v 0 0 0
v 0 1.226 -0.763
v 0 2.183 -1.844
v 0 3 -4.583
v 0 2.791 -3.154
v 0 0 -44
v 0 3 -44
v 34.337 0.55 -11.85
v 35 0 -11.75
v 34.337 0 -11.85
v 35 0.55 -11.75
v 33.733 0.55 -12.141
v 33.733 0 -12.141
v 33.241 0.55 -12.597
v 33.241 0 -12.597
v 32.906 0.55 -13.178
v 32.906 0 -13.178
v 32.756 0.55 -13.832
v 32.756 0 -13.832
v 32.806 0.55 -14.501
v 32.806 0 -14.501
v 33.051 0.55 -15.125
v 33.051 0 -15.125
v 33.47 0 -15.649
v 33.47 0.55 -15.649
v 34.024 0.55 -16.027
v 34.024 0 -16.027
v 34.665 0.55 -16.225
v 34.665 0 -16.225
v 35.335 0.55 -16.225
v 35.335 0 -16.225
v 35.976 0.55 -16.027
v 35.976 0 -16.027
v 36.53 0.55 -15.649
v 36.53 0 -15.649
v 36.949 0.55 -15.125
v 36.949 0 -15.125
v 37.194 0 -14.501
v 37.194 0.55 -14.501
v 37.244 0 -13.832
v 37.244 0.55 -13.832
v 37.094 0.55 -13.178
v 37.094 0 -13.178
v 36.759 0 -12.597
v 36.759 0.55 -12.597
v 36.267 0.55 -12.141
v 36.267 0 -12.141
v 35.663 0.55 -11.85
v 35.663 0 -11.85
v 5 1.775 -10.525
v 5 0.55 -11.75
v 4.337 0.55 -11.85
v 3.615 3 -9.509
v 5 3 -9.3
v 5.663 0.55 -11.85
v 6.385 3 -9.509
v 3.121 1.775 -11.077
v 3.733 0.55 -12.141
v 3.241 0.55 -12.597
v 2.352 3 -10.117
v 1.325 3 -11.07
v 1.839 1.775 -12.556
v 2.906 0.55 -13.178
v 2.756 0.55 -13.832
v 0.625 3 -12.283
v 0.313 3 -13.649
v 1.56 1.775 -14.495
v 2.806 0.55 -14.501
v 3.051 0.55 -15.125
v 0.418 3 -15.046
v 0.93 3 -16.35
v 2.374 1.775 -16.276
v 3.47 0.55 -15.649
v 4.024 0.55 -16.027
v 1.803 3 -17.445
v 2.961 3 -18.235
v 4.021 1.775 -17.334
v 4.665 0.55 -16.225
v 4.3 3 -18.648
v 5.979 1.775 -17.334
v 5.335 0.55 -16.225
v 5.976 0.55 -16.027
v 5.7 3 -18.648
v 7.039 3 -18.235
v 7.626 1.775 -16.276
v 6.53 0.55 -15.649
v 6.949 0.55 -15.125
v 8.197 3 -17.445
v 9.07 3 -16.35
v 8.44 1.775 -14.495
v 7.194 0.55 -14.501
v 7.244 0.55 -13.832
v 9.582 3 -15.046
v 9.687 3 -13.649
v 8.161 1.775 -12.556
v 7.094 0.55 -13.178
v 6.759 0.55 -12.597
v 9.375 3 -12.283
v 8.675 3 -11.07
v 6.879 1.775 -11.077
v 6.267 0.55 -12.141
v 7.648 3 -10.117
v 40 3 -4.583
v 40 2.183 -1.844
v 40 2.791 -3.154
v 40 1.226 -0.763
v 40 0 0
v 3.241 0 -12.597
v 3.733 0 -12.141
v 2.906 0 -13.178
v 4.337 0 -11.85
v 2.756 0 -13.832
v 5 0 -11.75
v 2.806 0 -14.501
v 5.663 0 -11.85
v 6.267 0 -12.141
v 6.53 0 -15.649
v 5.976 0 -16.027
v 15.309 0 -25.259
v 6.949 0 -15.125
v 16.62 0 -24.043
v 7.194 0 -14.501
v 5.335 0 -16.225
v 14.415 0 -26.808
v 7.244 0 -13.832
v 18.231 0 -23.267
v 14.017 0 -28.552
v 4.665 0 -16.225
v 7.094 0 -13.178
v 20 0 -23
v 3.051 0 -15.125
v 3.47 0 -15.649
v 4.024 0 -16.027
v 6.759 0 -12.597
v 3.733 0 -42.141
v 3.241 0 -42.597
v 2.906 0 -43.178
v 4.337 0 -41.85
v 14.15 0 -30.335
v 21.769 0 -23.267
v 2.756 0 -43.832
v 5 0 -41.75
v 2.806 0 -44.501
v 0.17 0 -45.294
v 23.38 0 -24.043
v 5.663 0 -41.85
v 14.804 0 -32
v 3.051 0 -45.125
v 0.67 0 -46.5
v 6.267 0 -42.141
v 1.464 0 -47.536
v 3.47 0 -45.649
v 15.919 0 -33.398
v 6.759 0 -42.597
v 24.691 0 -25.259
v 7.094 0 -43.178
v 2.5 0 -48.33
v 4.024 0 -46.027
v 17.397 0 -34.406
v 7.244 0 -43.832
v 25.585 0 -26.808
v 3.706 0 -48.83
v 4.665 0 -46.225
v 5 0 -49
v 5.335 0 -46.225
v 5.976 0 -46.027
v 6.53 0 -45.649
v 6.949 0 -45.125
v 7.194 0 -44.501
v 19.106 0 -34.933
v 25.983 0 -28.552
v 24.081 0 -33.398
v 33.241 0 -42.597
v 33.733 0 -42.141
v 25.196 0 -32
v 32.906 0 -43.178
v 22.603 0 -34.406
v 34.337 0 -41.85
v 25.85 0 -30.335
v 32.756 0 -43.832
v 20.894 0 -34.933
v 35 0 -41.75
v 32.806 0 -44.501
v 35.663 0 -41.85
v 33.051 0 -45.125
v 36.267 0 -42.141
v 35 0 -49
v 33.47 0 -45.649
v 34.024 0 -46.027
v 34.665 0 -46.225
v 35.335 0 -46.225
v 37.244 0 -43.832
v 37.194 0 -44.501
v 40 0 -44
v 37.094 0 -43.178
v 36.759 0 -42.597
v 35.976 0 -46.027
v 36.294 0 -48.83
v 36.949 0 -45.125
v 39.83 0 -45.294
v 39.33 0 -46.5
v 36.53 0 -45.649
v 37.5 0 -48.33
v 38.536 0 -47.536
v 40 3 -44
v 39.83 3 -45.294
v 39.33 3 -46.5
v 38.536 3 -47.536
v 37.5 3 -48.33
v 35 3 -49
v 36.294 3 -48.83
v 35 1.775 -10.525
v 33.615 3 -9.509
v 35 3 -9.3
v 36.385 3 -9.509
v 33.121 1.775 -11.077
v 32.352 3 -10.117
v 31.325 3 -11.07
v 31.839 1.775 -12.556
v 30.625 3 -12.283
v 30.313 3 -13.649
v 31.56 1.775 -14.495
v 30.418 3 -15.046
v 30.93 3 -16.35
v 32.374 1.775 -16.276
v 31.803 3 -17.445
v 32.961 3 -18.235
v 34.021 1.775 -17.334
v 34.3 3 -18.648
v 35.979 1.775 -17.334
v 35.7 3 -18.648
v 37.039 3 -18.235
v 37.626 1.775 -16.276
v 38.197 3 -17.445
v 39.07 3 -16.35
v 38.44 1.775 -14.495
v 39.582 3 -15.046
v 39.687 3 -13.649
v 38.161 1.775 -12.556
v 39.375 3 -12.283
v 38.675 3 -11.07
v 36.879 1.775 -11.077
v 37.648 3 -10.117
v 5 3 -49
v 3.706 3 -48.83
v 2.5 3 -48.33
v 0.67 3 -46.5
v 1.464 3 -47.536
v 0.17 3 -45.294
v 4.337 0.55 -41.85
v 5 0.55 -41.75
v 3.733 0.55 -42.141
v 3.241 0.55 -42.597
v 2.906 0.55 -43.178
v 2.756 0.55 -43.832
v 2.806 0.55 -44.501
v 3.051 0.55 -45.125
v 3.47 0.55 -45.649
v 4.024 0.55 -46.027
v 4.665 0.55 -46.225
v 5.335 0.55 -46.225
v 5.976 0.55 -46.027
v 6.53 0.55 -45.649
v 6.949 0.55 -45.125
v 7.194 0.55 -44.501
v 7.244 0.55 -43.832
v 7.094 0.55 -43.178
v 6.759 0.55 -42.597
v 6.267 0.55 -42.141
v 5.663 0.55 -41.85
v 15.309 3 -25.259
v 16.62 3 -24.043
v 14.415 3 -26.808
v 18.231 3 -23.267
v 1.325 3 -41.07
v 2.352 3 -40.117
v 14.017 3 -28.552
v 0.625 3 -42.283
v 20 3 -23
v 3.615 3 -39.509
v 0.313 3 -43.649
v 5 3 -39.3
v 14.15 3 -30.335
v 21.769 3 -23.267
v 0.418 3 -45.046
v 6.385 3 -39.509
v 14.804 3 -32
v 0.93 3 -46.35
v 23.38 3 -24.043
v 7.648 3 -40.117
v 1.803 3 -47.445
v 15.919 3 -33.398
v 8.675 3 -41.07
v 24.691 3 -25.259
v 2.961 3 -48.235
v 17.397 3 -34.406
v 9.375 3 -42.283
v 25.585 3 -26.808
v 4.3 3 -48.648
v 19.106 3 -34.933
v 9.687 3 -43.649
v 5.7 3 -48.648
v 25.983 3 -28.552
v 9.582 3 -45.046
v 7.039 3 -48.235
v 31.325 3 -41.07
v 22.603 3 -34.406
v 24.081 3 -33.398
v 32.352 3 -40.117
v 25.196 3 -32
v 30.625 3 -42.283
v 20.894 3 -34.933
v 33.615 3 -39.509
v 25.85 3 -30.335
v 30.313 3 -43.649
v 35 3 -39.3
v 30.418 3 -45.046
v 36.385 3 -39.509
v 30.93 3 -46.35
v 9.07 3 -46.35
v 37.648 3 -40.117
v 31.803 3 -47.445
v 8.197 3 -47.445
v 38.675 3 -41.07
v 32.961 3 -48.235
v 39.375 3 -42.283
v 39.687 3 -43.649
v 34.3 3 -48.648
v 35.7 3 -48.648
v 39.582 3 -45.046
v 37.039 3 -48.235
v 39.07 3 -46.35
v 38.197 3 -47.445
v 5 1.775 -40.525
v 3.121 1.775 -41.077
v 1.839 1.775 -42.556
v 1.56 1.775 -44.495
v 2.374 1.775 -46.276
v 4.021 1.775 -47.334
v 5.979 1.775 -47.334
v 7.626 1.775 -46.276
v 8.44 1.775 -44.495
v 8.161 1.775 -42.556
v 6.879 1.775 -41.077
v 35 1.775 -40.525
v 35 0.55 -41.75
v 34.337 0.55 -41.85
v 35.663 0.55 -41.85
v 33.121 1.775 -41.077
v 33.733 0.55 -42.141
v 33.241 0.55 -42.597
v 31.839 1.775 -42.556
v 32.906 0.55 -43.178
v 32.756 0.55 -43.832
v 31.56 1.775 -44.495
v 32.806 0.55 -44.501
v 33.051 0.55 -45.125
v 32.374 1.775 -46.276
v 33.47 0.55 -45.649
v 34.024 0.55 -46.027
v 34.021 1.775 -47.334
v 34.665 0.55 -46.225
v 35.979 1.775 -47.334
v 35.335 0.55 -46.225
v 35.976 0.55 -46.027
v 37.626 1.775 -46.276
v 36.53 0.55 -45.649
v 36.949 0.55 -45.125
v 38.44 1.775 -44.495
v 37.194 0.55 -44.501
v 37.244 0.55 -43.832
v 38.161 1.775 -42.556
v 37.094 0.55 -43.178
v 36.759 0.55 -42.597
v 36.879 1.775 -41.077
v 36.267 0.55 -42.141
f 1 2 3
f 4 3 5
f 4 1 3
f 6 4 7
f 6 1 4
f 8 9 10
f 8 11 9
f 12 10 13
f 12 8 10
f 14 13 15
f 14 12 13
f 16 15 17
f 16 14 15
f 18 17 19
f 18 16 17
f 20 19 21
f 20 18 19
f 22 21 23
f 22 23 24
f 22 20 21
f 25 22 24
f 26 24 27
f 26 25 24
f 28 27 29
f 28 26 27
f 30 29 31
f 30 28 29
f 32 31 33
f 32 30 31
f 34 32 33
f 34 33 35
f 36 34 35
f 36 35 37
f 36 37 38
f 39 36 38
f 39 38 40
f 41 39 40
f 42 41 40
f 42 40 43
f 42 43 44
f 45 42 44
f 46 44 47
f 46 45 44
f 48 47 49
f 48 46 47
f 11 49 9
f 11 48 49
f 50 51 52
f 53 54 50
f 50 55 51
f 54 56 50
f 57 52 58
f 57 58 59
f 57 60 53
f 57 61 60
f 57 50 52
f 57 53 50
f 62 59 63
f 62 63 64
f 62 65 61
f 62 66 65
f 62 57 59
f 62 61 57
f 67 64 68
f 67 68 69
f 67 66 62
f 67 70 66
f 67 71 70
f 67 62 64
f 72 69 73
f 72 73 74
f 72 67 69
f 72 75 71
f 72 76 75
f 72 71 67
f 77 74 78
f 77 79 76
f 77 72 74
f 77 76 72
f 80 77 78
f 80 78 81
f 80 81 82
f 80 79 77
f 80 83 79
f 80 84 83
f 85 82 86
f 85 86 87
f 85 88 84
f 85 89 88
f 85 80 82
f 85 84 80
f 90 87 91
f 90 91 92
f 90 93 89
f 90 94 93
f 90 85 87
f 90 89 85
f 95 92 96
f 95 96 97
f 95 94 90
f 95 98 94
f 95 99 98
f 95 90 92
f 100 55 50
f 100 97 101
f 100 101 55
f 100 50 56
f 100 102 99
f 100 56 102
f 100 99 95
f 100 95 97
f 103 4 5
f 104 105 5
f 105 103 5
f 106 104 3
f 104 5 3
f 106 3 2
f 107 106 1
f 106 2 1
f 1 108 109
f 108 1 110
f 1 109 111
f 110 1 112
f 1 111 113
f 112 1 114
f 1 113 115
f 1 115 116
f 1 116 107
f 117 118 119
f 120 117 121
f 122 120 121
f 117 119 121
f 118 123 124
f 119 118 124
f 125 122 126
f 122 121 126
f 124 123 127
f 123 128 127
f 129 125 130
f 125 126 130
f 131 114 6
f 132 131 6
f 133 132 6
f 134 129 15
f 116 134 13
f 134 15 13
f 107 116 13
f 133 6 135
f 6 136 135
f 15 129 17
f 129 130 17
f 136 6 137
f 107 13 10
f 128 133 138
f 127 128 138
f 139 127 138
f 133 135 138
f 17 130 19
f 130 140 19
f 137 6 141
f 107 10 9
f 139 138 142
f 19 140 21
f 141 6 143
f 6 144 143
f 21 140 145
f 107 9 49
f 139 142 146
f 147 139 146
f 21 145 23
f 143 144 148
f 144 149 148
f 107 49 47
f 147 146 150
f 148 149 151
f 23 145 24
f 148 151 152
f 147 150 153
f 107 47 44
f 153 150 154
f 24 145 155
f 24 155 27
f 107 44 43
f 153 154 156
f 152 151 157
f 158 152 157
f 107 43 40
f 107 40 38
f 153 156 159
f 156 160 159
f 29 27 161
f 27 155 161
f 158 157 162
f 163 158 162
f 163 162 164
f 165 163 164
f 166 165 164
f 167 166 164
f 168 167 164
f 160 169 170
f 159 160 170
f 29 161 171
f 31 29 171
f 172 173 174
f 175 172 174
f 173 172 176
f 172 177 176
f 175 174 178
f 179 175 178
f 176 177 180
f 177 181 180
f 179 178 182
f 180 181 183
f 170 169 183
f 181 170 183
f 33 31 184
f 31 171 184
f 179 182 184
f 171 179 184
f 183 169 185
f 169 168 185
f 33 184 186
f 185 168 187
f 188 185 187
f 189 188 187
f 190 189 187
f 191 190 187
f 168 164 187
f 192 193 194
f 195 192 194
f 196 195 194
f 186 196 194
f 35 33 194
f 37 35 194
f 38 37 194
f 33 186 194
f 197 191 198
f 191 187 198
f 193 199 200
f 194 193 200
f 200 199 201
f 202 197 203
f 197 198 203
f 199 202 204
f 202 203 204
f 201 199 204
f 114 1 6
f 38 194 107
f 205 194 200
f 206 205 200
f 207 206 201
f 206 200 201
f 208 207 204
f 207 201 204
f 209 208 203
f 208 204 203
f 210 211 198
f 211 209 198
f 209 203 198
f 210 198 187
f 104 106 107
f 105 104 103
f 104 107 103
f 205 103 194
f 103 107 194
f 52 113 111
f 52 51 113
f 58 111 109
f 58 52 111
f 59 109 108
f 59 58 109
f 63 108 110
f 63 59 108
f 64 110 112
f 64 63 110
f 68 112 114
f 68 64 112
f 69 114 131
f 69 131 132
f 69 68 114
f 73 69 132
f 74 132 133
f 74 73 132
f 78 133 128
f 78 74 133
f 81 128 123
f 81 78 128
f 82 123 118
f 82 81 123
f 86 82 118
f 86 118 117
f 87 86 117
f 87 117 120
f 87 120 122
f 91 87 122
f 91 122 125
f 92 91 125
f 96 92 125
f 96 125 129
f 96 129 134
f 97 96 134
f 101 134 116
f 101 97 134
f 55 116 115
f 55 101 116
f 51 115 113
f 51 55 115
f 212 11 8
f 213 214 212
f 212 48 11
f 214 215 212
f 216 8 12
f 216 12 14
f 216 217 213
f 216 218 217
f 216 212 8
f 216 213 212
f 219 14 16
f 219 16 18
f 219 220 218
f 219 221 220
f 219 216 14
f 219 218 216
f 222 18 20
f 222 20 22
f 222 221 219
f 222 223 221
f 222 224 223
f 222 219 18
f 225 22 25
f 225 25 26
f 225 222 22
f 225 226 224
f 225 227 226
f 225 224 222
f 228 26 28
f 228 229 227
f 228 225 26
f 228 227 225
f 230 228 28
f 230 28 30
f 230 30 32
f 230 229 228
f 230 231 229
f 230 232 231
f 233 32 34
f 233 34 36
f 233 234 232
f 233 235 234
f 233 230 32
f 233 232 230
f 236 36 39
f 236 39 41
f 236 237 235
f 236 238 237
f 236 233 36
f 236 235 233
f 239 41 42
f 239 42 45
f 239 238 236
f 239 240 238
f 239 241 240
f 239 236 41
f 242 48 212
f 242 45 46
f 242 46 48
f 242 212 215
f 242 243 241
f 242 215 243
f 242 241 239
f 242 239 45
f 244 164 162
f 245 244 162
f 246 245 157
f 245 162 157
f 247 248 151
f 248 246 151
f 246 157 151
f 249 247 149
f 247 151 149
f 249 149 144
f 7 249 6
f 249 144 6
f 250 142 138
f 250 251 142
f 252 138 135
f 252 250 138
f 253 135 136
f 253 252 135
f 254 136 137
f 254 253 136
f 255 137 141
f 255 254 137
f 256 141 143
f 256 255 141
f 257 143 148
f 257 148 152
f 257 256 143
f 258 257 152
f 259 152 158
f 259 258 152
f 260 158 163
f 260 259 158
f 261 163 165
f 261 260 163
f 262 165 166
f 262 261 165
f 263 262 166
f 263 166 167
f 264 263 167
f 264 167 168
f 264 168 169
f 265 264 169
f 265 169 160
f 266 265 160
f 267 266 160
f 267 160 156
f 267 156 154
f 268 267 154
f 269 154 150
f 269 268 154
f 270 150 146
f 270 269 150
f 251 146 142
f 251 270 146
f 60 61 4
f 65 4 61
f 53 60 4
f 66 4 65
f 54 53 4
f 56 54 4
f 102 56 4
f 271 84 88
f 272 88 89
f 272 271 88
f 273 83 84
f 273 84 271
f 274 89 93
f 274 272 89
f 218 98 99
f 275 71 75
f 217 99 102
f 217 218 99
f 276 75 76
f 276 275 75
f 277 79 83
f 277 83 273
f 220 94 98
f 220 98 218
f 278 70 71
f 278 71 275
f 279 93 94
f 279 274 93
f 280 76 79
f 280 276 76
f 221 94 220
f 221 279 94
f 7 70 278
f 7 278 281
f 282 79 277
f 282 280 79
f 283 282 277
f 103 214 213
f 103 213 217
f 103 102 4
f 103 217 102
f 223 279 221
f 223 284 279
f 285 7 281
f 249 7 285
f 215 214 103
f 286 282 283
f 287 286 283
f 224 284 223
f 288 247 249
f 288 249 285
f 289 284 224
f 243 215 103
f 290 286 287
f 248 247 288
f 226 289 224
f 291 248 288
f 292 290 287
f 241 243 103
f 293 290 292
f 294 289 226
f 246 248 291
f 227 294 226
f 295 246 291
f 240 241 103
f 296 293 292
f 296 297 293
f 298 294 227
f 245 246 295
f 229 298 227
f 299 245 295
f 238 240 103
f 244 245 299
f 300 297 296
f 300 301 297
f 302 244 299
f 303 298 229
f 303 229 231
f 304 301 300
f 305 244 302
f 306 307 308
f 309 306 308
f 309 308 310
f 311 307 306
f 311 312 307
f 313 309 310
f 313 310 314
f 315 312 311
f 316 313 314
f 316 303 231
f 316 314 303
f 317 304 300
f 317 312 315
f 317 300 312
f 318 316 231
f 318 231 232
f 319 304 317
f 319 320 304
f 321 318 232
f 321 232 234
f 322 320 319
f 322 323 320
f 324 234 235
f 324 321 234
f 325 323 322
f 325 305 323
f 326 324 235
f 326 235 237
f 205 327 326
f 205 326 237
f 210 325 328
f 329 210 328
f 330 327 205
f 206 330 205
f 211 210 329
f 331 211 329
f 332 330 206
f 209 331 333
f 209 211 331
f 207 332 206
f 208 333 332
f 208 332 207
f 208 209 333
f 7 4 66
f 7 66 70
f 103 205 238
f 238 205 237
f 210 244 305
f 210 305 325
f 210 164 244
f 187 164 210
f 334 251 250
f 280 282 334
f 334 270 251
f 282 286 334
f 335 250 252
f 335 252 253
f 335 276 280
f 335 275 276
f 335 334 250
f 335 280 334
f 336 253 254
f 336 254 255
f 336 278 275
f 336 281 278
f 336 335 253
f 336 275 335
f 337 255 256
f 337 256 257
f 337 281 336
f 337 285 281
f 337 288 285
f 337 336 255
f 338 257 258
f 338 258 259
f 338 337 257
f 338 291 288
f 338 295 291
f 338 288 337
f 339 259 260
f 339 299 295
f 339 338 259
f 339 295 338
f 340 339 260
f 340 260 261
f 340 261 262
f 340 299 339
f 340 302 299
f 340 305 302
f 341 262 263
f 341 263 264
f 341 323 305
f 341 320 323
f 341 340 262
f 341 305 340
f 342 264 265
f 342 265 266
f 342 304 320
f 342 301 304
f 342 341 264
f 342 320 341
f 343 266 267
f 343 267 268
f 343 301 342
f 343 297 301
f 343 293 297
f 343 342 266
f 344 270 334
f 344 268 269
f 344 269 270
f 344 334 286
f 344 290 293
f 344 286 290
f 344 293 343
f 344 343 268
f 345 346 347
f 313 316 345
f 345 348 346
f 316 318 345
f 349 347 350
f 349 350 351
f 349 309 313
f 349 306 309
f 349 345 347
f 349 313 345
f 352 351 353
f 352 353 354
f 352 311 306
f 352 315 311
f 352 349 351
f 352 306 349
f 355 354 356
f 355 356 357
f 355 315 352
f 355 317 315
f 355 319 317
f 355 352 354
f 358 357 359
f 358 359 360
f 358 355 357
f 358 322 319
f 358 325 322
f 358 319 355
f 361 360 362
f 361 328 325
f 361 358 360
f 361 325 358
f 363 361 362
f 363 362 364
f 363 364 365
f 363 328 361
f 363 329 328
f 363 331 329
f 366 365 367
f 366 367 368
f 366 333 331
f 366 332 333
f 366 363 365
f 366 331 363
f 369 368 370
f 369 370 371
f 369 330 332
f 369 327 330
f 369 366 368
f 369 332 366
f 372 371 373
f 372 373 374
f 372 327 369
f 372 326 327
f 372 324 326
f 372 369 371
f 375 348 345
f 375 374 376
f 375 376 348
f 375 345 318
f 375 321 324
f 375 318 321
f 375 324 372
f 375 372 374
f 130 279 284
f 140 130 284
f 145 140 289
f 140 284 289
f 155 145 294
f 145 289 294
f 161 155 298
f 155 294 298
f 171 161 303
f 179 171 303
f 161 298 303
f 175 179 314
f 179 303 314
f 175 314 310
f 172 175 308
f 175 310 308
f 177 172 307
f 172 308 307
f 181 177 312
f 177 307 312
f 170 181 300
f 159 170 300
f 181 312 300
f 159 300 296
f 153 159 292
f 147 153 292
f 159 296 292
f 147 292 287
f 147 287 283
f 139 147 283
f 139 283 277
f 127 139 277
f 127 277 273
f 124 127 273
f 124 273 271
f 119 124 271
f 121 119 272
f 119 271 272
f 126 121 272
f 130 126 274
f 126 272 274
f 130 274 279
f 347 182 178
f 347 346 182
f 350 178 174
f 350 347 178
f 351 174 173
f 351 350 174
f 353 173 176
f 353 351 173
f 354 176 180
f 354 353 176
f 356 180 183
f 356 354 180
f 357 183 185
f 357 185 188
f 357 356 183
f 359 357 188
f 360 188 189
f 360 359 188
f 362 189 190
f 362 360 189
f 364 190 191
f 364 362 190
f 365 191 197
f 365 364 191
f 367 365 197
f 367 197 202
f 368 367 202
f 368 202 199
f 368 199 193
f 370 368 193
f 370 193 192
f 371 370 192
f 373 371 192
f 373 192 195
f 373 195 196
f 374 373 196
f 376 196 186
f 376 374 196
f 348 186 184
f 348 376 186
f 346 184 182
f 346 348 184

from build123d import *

# Parameters (mm, degrees)
SKETCH1_W                                      = 40
SKETCH1_H                                      = 49
SKETCH1_W_2                                    = 30
SKETCH1_H_2                                    = 30
BOSS_EXTRUDE1_DEPTH                            = 3
FILLET1_R                                      = 5
CSK_FOR_M4_FLAT_HEAD_MACHINE_SCREW2_AT_2_COUNT = 2
CSK_FOR_M4_FLAT_HEAD_MACHINE_SCREW2_AT_2_PITCH = 30
CSK_FOR_M4_FLAT_HEAD_MACHINE_SCREW2_AT_3_COUNT = 2
CSK_FOR_M4_FLAT_HEAD_MACHINE_SCREW2_AT_3_PITCH = 42.426406871
CSK_FOR_M4_FLAT_HEAD_MACHINE_SCREW2_AT_4_COUNT = 2
CSK_FOR_M4_FLAT_HEAD_MACHINE_SCREW2_AT_4_PITCH = 30
SKETCH4_R                                      = 6
CUT_EXTRUDE1_DEPTH                             = 3


with BuildPart() as part:
    # Sketch1 → Boss-Extrude1 (new body)
    # profile 1 of 2: a face of its own
    with BuildSketch(Plane(origin=(0, 0, 0), x_dir=(1, 0, 0), z_dir=(0, 1, 0))):
        with Locations((20, 24.5)):
            Rectangle(SKETCH1_W, SKETCH1_H)
        with Locations((20, 29)):
            Rectangle(SKETCH1_W_2, SKETCH1_H_2, mode=Mode.SUBTRACT)
    # profile 2 of 2: a face of its own
    with BuildSketch(Plane(origin=(0, 0, 0), x_dir=(1, 0, 0), z_dir=(0, 1, 0))):
        with Locations((20, 29)):
            Rectangle(SKETCH1_W_2, SKETCH1_H_2)
    extrude(amount=BOSS_EXTRUDE1_DEPTH)

    # Fillet1
    # the kernel refuses this fillet: 5 mm, written as the material it takes off along each edge
    with BuildSketch(Plane(origin=(-11.456439237, 3, 0), x_dir=(0, -1, 0), z_dir=(1, 0, 0))) as fillet1_piece_1:
        with BuildLine():
            CenterArc((5, 4.582575695), FILLET1_R, 180, 66.421821522)
            Line((0, 4.582575695), (-0.1, 4.582575695))
            Line((-0.1, 4.582575695), (-0.1, 0))
            Line((-0.1, 0), (0, -0.1))
            ThreePointArc((0, -0.1), (1.5, -0.1), (2.96, -0.091651514))
            Line((2.96, -0.091651514), (3, 0))
        make_face()
    extrude(amount=62.912878475, mode=Mode.SUBTRACT)
    with BuildSketch(Plane(origin=(0, -12.5, -49), x_dir=(0, 0, 1), z_dir=(0, 1, 0))) as fillet1_piece_2:
        with BuildLine():
            CenterArc((FILLET1_R, FILLET1_R), FILLET1_R, 180, 90)
            Line((0, FILLET1_R), (-FILLET1_R * 0.02, FILLET1_R))
            Line((-FILLET1_R * 0.02, FILLET1_R), (-FILLET1_R * 0.02, -FILLET1_R * 0.02))
            Line((-FILLET1_R * 0.02, -FILLET1_R * 0.02), (FILLET1_R, -FILLET1_R * 0.02))
            Line((FILLET1_R, -FILLET1_R * 0.02), (FILLET1_R, 0))
        make_face()
    extrude(amount=28, mode=Mode.SUBTRACT)
    with BuildSketch(Plane(origin=(40, -12.5, -49), x_dir=(0, 0, 1), z_dir=(0, 1, 0))) as fillet1_piece_3:
        with BuildLine():
            CenterArc((FILLET1_R, -FILLET1_R), FILLET1_R, 90, 90)
            Line((0, -FILLET1_R), (-FILLET1_R * 0.02, -FILLET1_R))
            Line((-FILLET1_R * 0.02, -FILLET1_R), (-FILLET1_R * 0.02, FILLET1_R * 0.02))
            Line((-FILLET1_R * 0.02, FILLET1_R * 0.02), (FILLET1_R, FILLET1_R * 0.02))
            Line((FILLET1_R, FILLET1_R * 0.02), (FILLET1_R, 0))
        make_face()
    extrude(amount=28, mode=Mode.SUBTRACT)

    # Sketch3 → CSK for M4 Flat Head Machine Screw2 (revolve, cut)
    with BuildSketch(Plane(origin=(5, 3, -44), x_dir=(0, 0, 1), z_dir=(1, 0, 0))):
        Polygon((0, 0), (0, 3), (2.25, 3), (2.25, 2.45), (4.7, 0), align=None)
    csk_for_m4_flat_head_machine_screw2 = revolve(axis=Axis((5, 9.35, -44), (0, -1, 0)), mode=Mode.SUBTRACT)

    # CSK for M4 Flat Head Machine Screw2 at 2: CSK for M4 Flat Head Machine Screw2 ×2
    with Locations(*[(i * CSK_FOR_M4_FLAT_HEAD_MACHINE_SCREW2_AT_2_PITCH, 0, 0) for i in range(1, CSK_FOR_M4_FLAT_HEAD_MACHINE_SCREW2_AT_2_COUNT)]):
        add(csk_for_m4_flat_head_machine_screw2, mode=Mode.SUBTRACT)

    # CSK for M4 Flat Head Machine Screw2 at 3: CSK for M4 Flat Head Machine Screw2 ×2
    with Locations(*[Vector(0.7071067811865474, 0, 0.7071067811865477) * (i * CSK_FOR_M4_FLAT_HEAD_MACHINE_SCREW2_AT_3_PITCH) for i in range(1, CSK_FOR_M4_FLAT_HEAD_MACHINE_SCREW2_AT_3_COUNT)]):
        add(csk_for_m4_flat_head_machine_screw2, mode=Mode.SUBTRACT)

    # CSK for M4 Flat Head Machine Screw2 at 4: CSK for M4 Flat Head Machine Screw2 ×2
    with Locations(*[(0, 0, i * CSK_FOR_M4_FLAT_HEAD_MACHINE_SCREW2_AT_4_PITCH) for i in range(1, CSK_FOR_M4_FLAT_HEAD_MACHINE_SCREW2_AT_4_COUNT)]):
        add(csk_for_m4_flat_head_machine_screw2, mode=Mode.SUBTRACT)

    # Sketch4 → Cut-Extrude1 (cut)
    with BuildSketch(Plane(origin=(0, 3, 0), x_dir=(1, 0, 0), z_dir=(0, 1, 0))):
        with Locations(Location((20, 29, 0), (0, 0, 270))):
            Circle(SKETCH4_R)
    extrude(amount=-CUT_EXTRUDE1_DEPTH, mode=Mode.SUBTRACT)


solid = part.part
